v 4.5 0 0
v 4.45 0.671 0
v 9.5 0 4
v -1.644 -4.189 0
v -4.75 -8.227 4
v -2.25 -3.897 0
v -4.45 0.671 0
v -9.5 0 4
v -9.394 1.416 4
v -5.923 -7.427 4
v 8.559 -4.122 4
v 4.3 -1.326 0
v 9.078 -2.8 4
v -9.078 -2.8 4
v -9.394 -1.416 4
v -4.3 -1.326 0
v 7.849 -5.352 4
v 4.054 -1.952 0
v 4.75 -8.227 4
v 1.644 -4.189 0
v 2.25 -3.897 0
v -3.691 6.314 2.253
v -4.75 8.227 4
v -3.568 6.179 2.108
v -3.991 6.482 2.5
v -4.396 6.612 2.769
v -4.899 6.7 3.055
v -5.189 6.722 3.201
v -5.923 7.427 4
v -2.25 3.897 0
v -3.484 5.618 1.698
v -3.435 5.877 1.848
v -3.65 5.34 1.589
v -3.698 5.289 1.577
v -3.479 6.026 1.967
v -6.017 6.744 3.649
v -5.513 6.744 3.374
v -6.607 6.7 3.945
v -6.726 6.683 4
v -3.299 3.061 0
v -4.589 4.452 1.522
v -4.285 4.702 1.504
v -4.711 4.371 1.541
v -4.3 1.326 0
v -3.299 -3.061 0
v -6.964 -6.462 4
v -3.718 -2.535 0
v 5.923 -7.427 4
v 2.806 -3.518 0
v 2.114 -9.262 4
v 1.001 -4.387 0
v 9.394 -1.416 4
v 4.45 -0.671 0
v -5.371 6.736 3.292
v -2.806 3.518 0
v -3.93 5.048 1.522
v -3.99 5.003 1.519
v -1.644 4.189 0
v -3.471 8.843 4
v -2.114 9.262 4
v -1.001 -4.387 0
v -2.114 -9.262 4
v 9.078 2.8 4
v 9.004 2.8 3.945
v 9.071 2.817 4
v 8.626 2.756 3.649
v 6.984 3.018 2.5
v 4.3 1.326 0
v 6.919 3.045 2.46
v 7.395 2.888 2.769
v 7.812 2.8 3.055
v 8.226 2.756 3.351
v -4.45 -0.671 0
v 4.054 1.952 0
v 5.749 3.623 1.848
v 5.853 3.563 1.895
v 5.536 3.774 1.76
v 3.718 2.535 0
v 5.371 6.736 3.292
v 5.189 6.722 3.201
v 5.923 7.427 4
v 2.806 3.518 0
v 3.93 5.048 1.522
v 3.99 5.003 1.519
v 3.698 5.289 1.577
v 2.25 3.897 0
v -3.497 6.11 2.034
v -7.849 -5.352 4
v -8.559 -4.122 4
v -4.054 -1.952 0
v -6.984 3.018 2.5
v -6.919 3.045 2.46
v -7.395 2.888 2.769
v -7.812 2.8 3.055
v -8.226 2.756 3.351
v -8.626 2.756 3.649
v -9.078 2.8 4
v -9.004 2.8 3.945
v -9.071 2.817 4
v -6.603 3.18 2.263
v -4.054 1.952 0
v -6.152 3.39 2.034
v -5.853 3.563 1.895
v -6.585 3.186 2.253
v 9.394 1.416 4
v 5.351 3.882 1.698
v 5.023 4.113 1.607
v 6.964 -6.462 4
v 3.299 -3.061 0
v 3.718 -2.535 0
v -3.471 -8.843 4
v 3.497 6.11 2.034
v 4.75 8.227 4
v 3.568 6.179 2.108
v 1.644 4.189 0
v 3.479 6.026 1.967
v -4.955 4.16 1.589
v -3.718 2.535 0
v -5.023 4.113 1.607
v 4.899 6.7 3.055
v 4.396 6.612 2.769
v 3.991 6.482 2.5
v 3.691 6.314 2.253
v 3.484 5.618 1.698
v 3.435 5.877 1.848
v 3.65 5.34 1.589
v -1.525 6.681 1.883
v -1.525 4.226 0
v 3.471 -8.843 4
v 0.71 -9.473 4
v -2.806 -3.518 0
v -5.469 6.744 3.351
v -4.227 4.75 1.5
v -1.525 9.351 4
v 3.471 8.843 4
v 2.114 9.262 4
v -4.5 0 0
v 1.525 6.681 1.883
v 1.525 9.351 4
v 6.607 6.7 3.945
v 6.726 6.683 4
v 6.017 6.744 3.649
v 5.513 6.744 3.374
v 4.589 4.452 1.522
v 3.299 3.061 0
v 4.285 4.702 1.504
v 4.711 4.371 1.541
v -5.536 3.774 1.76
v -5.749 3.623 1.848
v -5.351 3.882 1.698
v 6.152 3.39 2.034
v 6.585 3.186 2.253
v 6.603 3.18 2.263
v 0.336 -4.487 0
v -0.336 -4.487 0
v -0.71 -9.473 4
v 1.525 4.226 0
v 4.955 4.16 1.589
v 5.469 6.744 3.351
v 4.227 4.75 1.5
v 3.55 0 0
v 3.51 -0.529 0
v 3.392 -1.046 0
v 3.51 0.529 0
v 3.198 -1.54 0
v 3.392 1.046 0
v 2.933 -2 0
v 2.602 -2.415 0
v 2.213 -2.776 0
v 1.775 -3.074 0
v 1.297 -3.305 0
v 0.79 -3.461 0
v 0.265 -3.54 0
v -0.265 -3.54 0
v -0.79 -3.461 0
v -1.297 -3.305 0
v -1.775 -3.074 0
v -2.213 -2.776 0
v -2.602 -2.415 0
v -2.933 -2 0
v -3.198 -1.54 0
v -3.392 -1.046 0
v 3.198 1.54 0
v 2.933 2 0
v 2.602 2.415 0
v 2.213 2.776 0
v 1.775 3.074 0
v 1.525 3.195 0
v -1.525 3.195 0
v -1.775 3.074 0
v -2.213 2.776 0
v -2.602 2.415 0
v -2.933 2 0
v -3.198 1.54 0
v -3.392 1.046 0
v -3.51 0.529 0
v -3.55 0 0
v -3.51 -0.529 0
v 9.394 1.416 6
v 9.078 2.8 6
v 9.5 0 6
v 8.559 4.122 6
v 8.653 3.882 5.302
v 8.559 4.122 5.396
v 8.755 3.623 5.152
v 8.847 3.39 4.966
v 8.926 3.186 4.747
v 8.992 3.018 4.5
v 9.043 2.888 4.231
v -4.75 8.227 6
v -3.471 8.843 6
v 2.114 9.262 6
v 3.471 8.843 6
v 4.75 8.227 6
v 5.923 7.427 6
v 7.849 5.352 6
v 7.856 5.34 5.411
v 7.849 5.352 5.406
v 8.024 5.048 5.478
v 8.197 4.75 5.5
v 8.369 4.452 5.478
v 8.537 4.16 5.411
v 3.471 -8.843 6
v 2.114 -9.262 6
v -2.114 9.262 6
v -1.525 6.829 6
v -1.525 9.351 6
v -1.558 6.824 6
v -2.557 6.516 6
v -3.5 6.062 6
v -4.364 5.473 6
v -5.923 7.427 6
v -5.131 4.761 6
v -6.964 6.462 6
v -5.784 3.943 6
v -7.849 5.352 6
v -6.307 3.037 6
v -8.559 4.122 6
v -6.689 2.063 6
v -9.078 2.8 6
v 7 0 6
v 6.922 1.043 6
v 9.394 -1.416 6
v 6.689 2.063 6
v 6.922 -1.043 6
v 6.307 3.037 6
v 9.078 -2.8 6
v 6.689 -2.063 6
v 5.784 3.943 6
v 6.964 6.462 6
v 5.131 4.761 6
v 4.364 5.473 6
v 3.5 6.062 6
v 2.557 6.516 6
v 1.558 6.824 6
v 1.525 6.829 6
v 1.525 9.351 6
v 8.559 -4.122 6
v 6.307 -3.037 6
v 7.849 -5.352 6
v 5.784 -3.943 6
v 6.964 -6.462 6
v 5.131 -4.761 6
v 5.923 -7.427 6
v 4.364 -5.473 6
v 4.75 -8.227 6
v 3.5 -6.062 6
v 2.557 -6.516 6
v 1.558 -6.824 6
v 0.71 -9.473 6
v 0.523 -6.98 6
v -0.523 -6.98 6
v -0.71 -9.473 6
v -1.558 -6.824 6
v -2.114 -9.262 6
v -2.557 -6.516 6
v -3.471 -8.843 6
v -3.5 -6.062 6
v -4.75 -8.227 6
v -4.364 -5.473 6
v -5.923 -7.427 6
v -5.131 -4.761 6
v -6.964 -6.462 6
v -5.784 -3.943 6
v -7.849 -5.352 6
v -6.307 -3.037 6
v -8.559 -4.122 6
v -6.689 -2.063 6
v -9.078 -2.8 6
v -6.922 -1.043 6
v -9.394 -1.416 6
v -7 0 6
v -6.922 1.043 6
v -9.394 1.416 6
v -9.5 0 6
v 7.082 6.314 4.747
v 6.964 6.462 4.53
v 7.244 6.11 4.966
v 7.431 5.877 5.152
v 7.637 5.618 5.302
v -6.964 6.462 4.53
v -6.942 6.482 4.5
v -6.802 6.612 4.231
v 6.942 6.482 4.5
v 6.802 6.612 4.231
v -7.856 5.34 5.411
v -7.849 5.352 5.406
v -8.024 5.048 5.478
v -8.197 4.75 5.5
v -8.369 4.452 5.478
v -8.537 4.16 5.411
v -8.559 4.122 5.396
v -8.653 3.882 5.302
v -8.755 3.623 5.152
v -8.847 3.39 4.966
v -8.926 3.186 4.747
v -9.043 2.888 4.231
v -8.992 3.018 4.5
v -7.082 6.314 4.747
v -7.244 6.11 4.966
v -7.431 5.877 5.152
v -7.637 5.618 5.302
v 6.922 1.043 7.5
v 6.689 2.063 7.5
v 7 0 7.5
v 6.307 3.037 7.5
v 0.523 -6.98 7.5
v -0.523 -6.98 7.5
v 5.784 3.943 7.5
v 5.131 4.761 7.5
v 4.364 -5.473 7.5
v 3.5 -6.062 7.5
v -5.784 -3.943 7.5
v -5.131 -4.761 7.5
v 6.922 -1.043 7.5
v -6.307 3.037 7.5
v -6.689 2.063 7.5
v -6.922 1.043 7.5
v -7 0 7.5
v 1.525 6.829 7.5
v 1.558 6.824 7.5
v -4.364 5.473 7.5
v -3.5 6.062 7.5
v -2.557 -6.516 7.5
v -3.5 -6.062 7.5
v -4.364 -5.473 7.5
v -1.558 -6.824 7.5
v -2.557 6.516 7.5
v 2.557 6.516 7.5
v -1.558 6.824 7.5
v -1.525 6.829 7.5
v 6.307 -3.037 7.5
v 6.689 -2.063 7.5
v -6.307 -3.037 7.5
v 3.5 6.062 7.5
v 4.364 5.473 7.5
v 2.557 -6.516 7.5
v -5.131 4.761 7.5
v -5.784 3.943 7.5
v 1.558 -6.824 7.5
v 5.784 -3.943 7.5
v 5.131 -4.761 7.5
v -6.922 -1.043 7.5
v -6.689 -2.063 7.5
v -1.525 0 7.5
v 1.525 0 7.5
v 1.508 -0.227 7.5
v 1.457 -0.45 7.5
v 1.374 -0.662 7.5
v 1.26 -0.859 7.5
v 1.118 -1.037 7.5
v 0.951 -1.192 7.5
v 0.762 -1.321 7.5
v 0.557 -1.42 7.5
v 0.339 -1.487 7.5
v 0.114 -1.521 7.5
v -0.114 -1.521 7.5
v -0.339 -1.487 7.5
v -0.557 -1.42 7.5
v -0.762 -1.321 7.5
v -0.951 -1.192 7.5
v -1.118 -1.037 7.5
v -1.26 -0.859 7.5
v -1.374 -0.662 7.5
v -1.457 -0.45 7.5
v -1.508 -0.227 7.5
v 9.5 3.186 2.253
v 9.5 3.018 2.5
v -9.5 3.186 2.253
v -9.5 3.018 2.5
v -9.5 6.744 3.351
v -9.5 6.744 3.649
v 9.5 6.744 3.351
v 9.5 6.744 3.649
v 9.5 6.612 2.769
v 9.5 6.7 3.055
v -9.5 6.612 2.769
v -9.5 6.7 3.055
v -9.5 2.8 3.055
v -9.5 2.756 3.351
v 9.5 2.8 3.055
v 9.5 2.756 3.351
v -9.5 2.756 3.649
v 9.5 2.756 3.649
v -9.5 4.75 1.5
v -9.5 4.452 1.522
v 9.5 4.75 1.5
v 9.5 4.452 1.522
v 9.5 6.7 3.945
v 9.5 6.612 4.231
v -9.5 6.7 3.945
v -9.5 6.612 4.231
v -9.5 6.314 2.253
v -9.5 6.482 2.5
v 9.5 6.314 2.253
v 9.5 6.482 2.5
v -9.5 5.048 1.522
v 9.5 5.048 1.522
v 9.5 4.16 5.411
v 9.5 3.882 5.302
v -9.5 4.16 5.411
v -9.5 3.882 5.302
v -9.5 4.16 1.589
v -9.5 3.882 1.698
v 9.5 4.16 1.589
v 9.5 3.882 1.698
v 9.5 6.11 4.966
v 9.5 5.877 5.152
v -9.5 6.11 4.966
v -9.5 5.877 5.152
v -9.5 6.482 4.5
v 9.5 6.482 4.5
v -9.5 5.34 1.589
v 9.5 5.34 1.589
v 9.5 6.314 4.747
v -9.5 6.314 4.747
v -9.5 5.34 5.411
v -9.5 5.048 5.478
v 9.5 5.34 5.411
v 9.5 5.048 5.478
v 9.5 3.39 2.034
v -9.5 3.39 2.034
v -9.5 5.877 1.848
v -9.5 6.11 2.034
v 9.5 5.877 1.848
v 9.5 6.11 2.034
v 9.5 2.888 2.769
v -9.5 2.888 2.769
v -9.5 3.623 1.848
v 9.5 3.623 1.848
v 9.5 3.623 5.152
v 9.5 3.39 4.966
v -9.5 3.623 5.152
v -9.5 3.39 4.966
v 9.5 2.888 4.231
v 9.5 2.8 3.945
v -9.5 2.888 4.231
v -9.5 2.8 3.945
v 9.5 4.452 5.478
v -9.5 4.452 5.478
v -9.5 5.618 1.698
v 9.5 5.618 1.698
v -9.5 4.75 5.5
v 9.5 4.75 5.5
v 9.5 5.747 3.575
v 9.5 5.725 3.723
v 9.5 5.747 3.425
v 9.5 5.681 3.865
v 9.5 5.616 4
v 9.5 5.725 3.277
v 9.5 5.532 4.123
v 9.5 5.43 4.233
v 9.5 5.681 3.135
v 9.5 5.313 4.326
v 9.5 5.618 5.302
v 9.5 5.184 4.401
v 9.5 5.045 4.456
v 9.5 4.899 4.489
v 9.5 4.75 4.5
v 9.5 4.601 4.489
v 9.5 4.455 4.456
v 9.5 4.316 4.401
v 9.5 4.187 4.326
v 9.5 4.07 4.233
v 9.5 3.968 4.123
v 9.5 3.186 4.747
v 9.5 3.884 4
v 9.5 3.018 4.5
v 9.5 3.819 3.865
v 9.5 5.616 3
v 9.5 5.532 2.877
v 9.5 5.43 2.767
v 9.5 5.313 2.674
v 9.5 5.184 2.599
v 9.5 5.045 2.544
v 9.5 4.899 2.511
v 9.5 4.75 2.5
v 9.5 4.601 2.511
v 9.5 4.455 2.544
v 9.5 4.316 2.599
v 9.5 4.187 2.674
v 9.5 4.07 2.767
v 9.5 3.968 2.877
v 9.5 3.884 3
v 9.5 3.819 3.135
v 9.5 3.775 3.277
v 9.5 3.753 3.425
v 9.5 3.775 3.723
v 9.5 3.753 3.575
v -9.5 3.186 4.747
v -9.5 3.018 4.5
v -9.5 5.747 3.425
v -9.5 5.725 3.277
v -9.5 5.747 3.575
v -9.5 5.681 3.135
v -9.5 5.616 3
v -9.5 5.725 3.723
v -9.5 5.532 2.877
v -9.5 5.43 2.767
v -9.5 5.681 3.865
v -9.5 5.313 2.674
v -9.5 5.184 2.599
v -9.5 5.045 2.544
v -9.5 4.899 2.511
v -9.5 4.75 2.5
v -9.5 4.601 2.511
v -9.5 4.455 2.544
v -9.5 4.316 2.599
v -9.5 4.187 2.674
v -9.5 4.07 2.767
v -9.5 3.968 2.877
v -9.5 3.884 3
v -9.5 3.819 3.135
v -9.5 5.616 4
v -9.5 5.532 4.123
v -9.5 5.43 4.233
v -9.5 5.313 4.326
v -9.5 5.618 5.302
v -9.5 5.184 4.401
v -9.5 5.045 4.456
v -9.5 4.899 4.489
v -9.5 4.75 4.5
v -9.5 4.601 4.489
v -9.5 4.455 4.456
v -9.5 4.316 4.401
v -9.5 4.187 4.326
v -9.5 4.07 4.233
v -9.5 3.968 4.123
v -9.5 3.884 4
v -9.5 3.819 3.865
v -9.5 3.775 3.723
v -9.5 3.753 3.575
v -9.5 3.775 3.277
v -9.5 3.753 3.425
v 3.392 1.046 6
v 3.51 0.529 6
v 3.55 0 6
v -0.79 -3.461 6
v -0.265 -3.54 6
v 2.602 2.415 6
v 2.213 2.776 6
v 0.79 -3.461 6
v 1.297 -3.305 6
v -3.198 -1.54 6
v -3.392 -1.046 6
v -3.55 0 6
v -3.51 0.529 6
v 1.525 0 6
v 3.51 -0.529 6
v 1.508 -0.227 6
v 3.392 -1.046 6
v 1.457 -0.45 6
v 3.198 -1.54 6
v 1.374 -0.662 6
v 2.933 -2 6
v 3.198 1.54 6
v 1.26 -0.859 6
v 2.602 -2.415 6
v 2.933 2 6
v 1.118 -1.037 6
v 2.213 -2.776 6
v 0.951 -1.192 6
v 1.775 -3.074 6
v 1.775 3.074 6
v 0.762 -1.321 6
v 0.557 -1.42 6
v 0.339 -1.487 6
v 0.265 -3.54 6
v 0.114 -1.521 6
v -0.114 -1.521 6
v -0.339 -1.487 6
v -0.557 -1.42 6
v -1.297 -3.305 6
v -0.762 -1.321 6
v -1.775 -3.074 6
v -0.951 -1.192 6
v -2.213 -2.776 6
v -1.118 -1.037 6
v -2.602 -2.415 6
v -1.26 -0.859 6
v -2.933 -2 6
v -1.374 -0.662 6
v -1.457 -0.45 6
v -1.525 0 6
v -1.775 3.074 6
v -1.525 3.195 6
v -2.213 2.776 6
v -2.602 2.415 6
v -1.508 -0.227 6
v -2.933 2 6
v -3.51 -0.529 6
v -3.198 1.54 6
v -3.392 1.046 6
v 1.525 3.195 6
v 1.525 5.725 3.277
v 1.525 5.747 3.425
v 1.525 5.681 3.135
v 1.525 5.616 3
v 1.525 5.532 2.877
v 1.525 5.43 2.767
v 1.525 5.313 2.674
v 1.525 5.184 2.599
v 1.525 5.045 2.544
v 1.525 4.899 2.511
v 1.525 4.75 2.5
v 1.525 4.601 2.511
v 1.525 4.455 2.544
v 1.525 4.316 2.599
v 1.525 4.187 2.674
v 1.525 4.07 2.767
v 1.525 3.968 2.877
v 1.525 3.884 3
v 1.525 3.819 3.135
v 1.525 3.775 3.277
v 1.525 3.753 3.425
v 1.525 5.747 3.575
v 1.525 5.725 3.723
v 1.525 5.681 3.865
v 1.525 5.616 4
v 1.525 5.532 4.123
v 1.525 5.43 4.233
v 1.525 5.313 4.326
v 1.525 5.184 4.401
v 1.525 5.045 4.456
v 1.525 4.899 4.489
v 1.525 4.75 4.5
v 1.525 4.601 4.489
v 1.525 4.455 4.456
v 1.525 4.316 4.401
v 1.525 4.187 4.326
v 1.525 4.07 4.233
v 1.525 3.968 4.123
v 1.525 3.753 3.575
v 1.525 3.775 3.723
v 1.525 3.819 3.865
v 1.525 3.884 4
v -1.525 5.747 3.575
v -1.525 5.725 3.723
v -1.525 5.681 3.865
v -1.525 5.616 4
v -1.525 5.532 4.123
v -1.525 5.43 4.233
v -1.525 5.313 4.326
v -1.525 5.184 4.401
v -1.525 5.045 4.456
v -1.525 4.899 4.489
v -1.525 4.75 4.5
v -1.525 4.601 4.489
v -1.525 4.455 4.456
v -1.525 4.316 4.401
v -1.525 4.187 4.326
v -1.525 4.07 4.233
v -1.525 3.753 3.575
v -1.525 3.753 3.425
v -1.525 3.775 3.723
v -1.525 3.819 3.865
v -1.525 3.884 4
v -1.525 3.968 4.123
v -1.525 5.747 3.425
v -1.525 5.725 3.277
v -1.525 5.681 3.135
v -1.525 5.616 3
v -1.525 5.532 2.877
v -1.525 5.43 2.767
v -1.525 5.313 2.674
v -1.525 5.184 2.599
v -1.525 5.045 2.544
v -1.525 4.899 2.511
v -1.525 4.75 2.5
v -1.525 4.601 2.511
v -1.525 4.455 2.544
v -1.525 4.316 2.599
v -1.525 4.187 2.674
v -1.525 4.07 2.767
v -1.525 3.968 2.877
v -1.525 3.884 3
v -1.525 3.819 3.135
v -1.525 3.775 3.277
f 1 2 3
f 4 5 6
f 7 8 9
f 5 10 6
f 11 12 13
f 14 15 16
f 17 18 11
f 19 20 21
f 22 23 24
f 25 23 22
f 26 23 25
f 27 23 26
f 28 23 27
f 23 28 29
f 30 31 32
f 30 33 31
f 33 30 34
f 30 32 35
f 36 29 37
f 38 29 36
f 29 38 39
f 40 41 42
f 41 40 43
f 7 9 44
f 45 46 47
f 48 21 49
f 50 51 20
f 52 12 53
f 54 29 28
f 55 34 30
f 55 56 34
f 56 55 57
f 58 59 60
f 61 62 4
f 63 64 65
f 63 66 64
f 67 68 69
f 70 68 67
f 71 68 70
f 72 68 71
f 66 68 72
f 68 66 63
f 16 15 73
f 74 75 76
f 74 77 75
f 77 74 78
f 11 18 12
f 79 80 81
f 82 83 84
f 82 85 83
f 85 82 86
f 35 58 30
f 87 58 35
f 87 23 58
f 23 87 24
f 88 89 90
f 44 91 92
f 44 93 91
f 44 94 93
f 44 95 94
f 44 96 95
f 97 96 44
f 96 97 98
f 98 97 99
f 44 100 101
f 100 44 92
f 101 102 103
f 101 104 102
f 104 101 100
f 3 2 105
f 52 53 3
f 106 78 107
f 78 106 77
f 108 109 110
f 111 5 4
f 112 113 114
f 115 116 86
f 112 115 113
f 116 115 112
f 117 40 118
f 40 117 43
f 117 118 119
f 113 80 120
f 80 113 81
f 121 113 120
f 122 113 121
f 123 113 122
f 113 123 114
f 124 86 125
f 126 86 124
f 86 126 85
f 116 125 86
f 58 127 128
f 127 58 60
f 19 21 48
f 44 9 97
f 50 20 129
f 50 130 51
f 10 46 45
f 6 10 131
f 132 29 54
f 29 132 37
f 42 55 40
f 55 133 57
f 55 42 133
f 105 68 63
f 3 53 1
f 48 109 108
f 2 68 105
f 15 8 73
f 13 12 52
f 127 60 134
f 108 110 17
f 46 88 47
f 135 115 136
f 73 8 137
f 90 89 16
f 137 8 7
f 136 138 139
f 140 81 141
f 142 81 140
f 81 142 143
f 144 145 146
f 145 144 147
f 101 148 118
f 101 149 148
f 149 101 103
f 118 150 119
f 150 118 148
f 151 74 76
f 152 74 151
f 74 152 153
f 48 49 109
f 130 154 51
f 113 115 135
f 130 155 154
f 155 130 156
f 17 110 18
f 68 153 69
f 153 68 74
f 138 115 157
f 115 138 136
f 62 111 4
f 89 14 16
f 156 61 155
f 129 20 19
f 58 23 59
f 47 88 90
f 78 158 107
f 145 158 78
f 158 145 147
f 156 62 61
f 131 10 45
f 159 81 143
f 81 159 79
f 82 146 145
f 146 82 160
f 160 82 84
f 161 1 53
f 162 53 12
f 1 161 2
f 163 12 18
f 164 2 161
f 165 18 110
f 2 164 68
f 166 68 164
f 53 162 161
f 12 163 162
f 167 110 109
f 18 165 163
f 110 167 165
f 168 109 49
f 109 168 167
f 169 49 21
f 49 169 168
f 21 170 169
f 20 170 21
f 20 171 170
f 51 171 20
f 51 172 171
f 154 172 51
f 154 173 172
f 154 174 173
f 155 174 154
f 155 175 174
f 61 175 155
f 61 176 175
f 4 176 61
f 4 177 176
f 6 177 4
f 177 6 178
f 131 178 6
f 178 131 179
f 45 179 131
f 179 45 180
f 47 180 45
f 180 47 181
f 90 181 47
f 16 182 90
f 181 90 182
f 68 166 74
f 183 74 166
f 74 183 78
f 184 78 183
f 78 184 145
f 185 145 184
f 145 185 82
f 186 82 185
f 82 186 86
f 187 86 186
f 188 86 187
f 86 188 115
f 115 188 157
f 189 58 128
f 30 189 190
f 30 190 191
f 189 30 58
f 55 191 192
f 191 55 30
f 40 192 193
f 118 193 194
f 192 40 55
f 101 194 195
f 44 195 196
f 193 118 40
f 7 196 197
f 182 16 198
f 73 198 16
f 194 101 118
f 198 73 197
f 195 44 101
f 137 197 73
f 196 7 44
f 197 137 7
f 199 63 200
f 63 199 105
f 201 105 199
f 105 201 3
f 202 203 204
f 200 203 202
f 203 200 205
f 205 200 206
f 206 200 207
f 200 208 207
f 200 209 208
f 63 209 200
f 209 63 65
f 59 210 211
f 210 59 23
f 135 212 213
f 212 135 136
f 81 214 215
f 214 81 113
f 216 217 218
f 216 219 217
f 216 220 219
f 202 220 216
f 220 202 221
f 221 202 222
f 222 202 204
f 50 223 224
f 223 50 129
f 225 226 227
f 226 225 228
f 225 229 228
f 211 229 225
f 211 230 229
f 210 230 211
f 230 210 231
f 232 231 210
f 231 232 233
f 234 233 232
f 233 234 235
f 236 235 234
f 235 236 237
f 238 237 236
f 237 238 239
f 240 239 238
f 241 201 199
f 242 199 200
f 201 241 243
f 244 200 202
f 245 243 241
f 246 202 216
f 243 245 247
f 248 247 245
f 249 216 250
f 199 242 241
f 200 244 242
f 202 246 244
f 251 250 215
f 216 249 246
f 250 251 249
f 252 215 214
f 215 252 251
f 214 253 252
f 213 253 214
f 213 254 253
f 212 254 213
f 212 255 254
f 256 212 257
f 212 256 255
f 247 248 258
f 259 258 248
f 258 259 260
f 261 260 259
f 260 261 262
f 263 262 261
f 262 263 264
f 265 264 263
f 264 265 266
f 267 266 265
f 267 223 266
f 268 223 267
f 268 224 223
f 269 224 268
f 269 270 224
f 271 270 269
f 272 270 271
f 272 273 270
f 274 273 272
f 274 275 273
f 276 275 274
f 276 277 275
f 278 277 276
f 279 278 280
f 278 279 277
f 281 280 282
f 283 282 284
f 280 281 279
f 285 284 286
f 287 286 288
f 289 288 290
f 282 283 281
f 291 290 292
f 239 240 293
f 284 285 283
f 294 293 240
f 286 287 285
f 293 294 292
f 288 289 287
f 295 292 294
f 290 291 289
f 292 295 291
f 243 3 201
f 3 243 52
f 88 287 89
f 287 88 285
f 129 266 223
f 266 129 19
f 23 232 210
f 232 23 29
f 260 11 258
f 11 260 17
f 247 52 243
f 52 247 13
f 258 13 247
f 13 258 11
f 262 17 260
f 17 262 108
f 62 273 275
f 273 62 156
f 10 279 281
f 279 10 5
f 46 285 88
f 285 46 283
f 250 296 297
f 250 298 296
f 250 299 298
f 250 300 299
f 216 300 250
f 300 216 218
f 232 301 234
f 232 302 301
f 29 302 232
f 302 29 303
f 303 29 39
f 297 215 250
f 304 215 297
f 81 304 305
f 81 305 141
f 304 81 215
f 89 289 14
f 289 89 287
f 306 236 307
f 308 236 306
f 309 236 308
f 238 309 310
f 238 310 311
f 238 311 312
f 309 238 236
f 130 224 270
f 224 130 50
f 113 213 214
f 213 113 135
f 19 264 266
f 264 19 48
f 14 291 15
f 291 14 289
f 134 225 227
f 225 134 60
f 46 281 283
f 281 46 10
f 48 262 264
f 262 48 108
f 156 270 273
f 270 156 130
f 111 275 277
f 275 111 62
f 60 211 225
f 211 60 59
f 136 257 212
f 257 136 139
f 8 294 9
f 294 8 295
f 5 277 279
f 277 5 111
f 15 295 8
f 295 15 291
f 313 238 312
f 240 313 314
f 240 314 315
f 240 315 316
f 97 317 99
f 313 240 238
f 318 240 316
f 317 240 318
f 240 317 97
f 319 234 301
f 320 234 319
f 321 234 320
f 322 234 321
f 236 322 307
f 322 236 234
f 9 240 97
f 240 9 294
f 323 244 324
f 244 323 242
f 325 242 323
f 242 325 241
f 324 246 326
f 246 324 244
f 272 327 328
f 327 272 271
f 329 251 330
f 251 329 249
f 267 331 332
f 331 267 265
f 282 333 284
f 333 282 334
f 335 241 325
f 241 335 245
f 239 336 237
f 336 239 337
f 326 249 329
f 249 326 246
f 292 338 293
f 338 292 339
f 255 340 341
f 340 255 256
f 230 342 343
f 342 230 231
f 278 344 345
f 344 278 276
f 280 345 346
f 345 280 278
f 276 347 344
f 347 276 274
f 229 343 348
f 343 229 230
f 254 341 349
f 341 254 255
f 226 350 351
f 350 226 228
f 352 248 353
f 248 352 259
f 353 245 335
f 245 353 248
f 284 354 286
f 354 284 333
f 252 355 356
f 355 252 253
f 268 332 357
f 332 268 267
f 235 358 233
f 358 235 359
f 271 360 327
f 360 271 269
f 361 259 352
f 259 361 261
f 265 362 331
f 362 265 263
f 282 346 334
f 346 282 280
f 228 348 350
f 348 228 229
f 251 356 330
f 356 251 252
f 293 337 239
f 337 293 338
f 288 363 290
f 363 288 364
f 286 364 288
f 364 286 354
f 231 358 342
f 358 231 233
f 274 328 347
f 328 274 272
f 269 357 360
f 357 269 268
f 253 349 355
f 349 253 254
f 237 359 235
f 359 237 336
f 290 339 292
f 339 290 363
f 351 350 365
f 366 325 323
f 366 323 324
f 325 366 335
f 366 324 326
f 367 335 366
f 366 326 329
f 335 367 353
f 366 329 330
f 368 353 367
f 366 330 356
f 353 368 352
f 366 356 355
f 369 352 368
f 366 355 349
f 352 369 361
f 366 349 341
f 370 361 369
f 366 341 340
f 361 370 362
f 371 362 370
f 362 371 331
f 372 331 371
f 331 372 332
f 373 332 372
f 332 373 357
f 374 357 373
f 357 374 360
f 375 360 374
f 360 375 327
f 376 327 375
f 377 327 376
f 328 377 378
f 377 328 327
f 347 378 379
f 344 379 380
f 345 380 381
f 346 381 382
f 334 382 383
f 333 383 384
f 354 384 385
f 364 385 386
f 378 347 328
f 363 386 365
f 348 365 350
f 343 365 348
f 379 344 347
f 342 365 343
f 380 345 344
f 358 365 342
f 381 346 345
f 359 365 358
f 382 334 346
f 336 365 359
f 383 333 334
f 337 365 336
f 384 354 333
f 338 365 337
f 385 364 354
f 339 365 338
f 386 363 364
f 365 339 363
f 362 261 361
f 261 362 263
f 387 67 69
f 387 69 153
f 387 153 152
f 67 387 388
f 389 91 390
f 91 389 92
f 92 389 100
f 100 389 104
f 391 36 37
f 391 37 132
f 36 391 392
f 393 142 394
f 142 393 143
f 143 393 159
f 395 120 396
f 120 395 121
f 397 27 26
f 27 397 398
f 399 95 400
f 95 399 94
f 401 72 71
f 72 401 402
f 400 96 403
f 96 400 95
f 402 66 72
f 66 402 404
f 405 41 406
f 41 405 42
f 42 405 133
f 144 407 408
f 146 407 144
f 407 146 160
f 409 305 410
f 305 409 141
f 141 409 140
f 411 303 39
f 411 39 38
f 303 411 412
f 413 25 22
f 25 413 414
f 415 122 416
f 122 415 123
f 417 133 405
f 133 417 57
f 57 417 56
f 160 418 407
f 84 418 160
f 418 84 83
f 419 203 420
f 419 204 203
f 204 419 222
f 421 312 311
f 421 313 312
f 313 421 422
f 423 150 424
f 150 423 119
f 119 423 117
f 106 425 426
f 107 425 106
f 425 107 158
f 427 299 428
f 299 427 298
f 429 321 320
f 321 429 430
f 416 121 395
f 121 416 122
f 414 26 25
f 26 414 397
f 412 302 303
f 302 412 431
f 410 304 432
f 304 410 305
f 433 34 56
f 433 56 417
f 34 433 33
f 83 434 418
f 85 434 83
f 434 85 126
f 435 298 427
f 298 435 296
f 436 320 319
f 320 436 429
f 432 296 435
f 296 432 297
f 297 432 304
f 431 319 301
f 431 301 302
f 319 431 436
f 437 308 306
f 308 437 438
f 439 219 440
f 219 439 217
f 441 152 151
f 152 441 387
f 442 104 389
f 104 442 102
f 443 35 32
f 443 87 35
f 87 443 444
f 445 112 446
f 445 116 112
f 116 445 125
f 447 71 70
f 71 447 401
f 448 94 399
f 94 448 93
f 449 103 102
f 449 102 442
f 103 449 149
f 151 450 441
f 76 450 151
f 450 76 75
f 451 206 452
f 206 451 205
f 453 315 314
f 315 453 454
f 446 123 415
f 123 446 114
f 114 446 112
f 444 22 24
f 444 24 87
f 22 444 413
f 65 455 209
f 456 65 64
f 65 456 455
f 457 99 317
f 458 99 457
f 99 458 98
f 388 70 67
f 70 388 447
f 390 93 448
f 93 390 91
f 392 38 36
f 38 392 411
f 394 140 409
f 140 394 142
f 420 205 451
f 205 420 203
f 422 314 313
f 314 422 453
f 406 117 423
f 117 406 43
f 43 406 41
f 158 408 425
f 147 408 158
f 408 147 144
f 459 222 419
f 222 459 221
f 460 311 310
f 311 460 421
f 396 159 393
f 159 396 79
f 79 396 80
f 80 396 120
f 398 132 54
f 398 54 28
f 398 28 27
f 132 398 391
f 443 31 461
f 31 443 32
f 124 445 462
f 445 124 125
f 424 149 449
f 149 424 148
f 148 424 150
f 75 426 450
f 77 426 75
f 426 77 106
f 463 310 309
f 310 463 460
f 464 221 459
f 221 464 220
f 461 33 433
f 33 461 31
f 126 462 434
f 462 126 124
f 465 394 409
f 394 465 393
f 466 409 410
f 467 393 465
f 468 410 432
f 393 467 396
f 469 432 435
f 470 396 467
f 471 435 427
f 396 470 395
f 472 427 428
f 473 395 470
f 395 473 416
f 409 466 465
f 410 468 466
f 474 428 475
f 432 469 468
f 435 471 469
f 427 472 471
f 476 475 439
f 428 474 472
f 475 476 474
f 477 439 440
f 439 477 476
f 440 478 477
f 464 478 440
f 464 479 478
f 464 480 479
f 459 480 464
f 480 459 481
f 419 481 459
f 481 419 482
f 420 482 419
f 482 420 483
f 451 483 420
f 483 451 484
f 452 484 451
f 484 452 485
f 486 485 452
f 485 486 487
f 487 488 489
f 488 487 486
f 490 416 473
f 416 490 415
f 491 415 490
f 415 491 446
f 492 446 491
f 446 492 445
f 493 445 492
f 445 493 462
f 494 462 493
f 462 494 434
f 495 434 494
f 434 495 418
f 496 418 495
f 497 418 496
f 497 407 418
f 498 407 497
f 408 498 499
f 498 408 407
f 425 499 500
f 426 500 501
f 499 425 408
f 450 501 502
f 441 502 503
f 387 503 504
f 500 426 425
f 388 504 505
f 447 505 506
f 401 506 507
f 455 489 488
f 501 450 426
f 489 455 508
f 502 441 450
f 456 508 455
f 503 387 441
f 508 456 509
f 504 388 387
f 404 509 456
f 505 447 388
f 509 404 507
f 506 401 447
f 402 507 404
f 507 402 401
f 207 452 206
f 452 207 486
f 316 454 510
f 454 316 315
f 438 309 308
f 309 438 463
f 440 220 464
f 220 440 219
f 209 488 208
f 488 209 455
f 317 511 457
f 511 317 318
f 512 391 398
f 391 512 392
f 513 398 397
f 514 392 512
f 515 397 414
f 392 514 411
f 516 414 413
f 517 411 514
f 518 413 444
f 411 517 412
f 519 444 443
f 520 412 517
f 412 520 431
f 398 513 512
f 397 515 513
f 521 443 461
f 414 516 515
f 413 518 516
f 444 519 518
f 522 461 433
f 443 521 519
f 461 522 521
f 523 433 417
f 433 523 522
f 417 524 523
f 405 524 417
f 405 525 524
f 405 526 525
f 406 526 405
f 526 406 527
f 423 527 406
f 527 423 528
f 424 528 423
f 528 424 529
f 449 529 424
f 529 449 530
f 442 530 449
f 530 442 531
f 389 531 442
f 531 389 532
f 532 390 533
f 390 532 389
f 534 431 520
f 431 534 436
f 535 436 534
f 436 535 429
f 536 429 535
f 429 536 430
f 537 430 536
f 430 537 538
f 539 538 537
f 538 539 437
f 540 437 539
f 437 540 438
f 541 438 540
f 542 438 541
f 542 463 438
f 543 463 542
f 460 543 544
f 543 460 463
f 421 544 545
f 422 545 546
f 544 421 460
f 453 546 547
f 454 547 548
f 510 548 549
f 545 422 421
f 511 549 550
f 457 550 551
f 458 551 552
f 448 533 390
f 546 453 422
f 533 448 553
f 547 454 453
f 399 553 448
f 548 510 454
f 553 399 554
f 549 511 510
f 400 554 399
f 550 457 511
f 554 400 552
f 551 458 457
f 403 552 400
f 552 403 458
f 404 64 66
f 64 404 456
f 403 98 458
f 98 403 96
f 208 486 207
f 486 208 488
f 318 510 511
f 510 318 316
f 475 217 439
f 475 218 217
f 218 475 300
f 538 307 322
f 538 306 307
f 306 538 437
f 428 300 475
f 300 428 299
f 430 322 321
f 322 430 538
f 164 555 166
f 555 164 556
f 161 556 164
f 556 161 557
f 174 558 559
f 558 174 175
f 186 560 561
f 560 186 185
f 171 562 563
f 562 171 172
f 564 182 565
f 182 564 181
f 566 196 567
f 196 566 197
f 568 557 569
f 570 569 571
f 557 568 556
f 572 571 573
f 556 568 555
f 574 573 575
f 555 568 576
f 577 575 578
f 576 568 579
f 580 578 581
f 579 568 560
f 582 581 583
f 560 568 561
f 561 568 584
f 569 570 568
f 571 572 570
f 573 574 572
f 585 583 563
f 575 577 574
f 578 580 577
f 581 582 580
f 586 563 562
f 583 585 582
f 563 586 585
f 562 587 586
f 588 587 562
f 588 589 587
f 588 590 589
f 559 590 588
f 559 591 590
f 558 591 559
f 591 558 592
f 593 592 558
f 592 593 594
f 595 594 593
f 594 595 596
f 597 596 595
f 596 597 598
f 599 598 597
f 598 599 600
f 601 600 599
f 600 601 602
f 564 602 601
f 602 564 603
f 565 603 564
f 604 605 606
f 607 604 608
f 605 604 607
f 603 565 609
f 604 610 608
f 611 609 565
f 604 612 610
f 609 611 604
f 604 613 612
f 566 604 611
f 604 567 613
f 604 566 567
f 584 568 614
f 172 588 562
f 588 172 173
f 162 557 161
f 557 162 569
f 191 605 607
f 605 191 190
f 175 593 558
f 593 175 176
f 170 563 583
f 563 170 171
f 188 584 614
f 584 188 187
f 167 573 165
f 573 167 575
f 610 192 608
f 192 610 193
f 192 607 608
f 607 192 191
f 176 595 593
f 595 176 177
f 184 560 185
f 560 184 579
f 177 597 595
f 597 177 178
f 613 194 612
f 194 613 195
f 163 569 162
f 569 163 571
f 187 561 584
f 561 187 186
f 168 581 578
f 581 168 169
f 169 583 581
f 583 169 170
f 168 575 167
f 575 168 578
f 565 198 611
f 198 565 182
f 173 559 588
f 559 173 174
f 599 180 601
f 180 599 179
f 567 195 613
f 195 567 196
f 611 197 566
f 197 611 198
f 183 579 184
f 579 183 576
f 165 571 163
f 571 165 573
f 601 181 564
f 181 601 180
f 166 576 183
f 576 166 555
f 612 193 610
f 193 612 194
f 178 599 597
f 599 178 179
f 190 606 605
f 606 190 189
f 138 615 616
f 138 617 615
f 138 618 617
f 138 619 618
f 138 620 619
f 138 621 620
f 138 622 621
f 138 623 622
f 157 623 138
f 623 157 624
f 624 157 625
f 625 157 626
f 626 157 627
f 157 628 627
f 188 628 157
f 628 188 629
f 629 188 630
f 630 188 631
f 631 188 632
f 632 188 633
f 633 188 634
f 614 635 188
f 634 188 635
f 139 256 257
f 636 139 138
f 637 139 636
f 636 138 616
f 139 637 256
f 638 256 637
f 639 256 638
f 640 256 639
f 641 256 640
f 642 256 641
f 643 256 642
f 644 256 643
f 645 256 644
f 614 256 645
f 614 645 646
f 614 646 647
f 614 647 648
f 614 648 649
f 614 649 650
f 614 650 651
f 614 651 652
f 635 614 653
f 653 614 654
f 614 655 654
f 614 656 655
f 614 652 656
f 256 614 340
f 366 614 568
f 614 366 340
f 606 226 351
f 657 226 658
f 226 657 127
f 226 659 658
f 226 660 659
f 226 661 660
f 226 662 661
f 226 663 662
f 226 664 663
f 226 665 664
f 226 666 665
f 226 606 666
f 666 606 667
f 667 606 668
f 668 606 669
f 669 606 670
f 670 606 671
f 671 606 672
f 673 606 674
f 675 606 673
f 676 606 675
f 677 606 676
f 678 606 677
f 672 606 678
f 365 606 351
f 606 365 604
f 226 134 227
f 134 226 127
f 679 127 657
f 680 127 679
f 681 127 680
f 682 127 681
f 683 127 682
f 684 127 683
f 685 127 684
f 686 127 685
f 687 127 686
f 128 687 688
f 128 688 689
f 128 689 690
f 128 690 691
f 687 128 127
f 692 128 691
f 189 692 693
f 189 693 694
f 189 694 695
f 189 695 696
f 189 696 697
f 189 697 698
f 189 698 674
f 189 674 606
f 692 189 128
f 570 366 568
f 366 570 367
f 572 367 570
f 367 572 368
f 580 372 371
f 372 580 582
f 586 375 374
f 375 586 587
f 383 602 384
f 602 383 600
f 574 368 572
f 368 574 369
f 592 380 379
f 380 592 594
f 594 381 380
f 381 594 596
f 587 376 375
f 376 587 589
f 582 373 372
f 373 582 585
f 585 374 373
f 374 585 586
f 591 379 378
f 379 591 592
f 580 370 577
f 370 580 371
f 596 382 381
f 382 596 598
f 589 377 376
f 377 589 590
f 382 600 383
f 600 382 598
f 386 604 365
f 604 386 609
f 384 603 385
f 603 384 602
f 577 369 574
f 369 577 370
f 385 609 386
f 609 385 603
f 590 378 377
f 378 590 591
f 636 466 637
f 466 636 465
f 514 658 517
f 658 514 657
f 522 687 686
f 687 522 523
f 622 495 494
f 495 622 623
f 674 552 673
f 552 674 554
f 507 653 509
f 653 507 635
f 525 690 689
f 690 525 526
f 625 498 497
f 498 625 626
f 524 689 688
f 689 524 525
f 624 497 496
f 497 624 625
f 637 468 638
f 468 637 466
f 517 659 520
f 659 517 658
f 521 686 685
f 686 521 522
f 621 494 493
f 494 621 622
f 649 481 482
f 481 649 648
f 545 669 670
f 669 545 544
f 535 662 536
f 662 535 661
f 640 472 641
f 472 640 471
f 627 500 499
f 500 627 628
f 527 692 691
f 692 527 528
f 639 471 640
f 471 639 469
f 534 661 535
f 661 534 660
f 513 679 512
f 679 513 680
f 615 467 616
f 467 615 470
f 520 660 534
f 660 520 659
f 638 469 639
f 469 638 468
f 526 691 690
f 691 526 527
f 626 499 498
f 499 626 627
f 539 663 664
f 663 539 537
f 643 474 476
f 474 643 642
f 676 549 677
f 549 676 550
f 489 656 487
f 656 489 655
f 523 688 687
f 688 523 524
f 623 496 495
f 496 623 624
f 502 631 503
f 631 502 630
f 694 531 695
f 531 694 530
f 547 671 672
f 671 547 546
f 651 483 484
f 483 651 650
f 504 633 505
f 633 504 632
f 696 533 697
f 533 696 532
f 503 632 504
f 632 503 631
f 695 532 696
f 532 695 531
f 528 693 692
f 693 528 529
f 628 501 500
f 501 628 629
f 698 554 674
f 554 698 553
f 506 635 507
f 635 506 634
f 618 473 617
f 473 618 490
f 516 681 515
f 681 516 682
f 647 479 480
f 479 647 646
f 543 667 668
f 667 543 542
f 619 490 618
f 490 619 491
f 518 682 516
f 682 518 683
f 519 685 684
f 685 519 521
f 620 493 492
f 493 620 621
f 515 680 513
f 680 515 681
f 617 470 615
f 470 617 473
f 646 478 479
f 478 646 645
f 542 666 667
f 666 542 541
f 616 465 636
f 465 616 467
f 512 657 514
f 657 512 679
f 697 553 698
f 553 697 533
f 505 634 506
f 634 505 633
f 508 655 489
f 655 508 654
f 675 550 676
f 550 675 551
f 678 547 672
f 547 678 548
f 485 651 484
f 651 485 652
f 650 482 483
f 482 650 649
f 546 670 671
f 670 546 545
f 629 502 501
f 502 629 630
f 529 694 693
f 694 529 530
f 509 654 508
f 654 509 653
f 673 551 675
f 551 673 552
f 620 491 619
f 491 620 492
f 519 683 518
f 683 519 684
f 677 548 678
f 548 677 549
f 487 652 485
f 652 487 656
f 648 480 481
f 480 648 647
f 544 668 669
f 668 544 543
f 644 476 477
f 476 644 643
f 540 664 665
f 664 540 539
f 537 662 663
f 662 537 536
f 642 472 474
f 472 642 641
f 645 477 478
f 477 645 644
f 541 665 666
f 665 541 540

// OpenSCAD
/* Tamiya Damper Spring Cup/Retention Disk X5/V5 (Federteller)

   Fits at least TT-02B and DT-03. Probably many other chassis, too.
   
*/

//$fn=23;
$fn=42;
gRodDia=3.05;

 /* front, no screw */
if (0)
cup(7, 15+2, 0);

 /* front, with locking screw */
if (0)
cup(7, 15+2, 2.0); // M2

 /* rear, no screw */
if (0)
//translate([+30, 0, 0])
cup(7, 17+2, 0);

/* rear, with locking screw */
if (1)
//translate([+30, 0, 0])
cup(7, 17+2, 2.0); // M2

module cup(d1, d2, sd)
{
	difference()
	{
		union()
		{
			/* lower cone */
										cylinder(d1=d1+2, d2=d2, h=4.0);
			
			/* spring retention disk */
			translate([0, 0, 4])		cylinder(d=d2, h=2.0); 
			
			/* spring centering disk */
			translate([0, 0, 4+2.0]) 	cylinder(d=d2-2-3, h=1.5); 
			
			/* lock */
			if (sd>0)
			{
				translate([0, d2/2/2, (4+2)-(sd+3)/2])
				rotate([0, 90, 0])
				cylinder(d=sd+2, h=d2/1, center=true);
			}
		}

		/* ball end connector */
		cylinder(d=d1+0.1, h=4+2);
		
		/* insertion dingenskirchens schlitz */ 
		translate([0, 10/2, 0])
		cube([gRodDia, 10, 23], center=true);
		cylinder(d=gRodDia, h=23);
		
		/* room for screw */
		if (sd>0)
		{
				translate([0, d2/2/2, (4+2)-(sd+3)/2])
				rotate([0, 90, 0])
				cylinder(d=sd, h=d2/1, center=true);
		}

	}
}
